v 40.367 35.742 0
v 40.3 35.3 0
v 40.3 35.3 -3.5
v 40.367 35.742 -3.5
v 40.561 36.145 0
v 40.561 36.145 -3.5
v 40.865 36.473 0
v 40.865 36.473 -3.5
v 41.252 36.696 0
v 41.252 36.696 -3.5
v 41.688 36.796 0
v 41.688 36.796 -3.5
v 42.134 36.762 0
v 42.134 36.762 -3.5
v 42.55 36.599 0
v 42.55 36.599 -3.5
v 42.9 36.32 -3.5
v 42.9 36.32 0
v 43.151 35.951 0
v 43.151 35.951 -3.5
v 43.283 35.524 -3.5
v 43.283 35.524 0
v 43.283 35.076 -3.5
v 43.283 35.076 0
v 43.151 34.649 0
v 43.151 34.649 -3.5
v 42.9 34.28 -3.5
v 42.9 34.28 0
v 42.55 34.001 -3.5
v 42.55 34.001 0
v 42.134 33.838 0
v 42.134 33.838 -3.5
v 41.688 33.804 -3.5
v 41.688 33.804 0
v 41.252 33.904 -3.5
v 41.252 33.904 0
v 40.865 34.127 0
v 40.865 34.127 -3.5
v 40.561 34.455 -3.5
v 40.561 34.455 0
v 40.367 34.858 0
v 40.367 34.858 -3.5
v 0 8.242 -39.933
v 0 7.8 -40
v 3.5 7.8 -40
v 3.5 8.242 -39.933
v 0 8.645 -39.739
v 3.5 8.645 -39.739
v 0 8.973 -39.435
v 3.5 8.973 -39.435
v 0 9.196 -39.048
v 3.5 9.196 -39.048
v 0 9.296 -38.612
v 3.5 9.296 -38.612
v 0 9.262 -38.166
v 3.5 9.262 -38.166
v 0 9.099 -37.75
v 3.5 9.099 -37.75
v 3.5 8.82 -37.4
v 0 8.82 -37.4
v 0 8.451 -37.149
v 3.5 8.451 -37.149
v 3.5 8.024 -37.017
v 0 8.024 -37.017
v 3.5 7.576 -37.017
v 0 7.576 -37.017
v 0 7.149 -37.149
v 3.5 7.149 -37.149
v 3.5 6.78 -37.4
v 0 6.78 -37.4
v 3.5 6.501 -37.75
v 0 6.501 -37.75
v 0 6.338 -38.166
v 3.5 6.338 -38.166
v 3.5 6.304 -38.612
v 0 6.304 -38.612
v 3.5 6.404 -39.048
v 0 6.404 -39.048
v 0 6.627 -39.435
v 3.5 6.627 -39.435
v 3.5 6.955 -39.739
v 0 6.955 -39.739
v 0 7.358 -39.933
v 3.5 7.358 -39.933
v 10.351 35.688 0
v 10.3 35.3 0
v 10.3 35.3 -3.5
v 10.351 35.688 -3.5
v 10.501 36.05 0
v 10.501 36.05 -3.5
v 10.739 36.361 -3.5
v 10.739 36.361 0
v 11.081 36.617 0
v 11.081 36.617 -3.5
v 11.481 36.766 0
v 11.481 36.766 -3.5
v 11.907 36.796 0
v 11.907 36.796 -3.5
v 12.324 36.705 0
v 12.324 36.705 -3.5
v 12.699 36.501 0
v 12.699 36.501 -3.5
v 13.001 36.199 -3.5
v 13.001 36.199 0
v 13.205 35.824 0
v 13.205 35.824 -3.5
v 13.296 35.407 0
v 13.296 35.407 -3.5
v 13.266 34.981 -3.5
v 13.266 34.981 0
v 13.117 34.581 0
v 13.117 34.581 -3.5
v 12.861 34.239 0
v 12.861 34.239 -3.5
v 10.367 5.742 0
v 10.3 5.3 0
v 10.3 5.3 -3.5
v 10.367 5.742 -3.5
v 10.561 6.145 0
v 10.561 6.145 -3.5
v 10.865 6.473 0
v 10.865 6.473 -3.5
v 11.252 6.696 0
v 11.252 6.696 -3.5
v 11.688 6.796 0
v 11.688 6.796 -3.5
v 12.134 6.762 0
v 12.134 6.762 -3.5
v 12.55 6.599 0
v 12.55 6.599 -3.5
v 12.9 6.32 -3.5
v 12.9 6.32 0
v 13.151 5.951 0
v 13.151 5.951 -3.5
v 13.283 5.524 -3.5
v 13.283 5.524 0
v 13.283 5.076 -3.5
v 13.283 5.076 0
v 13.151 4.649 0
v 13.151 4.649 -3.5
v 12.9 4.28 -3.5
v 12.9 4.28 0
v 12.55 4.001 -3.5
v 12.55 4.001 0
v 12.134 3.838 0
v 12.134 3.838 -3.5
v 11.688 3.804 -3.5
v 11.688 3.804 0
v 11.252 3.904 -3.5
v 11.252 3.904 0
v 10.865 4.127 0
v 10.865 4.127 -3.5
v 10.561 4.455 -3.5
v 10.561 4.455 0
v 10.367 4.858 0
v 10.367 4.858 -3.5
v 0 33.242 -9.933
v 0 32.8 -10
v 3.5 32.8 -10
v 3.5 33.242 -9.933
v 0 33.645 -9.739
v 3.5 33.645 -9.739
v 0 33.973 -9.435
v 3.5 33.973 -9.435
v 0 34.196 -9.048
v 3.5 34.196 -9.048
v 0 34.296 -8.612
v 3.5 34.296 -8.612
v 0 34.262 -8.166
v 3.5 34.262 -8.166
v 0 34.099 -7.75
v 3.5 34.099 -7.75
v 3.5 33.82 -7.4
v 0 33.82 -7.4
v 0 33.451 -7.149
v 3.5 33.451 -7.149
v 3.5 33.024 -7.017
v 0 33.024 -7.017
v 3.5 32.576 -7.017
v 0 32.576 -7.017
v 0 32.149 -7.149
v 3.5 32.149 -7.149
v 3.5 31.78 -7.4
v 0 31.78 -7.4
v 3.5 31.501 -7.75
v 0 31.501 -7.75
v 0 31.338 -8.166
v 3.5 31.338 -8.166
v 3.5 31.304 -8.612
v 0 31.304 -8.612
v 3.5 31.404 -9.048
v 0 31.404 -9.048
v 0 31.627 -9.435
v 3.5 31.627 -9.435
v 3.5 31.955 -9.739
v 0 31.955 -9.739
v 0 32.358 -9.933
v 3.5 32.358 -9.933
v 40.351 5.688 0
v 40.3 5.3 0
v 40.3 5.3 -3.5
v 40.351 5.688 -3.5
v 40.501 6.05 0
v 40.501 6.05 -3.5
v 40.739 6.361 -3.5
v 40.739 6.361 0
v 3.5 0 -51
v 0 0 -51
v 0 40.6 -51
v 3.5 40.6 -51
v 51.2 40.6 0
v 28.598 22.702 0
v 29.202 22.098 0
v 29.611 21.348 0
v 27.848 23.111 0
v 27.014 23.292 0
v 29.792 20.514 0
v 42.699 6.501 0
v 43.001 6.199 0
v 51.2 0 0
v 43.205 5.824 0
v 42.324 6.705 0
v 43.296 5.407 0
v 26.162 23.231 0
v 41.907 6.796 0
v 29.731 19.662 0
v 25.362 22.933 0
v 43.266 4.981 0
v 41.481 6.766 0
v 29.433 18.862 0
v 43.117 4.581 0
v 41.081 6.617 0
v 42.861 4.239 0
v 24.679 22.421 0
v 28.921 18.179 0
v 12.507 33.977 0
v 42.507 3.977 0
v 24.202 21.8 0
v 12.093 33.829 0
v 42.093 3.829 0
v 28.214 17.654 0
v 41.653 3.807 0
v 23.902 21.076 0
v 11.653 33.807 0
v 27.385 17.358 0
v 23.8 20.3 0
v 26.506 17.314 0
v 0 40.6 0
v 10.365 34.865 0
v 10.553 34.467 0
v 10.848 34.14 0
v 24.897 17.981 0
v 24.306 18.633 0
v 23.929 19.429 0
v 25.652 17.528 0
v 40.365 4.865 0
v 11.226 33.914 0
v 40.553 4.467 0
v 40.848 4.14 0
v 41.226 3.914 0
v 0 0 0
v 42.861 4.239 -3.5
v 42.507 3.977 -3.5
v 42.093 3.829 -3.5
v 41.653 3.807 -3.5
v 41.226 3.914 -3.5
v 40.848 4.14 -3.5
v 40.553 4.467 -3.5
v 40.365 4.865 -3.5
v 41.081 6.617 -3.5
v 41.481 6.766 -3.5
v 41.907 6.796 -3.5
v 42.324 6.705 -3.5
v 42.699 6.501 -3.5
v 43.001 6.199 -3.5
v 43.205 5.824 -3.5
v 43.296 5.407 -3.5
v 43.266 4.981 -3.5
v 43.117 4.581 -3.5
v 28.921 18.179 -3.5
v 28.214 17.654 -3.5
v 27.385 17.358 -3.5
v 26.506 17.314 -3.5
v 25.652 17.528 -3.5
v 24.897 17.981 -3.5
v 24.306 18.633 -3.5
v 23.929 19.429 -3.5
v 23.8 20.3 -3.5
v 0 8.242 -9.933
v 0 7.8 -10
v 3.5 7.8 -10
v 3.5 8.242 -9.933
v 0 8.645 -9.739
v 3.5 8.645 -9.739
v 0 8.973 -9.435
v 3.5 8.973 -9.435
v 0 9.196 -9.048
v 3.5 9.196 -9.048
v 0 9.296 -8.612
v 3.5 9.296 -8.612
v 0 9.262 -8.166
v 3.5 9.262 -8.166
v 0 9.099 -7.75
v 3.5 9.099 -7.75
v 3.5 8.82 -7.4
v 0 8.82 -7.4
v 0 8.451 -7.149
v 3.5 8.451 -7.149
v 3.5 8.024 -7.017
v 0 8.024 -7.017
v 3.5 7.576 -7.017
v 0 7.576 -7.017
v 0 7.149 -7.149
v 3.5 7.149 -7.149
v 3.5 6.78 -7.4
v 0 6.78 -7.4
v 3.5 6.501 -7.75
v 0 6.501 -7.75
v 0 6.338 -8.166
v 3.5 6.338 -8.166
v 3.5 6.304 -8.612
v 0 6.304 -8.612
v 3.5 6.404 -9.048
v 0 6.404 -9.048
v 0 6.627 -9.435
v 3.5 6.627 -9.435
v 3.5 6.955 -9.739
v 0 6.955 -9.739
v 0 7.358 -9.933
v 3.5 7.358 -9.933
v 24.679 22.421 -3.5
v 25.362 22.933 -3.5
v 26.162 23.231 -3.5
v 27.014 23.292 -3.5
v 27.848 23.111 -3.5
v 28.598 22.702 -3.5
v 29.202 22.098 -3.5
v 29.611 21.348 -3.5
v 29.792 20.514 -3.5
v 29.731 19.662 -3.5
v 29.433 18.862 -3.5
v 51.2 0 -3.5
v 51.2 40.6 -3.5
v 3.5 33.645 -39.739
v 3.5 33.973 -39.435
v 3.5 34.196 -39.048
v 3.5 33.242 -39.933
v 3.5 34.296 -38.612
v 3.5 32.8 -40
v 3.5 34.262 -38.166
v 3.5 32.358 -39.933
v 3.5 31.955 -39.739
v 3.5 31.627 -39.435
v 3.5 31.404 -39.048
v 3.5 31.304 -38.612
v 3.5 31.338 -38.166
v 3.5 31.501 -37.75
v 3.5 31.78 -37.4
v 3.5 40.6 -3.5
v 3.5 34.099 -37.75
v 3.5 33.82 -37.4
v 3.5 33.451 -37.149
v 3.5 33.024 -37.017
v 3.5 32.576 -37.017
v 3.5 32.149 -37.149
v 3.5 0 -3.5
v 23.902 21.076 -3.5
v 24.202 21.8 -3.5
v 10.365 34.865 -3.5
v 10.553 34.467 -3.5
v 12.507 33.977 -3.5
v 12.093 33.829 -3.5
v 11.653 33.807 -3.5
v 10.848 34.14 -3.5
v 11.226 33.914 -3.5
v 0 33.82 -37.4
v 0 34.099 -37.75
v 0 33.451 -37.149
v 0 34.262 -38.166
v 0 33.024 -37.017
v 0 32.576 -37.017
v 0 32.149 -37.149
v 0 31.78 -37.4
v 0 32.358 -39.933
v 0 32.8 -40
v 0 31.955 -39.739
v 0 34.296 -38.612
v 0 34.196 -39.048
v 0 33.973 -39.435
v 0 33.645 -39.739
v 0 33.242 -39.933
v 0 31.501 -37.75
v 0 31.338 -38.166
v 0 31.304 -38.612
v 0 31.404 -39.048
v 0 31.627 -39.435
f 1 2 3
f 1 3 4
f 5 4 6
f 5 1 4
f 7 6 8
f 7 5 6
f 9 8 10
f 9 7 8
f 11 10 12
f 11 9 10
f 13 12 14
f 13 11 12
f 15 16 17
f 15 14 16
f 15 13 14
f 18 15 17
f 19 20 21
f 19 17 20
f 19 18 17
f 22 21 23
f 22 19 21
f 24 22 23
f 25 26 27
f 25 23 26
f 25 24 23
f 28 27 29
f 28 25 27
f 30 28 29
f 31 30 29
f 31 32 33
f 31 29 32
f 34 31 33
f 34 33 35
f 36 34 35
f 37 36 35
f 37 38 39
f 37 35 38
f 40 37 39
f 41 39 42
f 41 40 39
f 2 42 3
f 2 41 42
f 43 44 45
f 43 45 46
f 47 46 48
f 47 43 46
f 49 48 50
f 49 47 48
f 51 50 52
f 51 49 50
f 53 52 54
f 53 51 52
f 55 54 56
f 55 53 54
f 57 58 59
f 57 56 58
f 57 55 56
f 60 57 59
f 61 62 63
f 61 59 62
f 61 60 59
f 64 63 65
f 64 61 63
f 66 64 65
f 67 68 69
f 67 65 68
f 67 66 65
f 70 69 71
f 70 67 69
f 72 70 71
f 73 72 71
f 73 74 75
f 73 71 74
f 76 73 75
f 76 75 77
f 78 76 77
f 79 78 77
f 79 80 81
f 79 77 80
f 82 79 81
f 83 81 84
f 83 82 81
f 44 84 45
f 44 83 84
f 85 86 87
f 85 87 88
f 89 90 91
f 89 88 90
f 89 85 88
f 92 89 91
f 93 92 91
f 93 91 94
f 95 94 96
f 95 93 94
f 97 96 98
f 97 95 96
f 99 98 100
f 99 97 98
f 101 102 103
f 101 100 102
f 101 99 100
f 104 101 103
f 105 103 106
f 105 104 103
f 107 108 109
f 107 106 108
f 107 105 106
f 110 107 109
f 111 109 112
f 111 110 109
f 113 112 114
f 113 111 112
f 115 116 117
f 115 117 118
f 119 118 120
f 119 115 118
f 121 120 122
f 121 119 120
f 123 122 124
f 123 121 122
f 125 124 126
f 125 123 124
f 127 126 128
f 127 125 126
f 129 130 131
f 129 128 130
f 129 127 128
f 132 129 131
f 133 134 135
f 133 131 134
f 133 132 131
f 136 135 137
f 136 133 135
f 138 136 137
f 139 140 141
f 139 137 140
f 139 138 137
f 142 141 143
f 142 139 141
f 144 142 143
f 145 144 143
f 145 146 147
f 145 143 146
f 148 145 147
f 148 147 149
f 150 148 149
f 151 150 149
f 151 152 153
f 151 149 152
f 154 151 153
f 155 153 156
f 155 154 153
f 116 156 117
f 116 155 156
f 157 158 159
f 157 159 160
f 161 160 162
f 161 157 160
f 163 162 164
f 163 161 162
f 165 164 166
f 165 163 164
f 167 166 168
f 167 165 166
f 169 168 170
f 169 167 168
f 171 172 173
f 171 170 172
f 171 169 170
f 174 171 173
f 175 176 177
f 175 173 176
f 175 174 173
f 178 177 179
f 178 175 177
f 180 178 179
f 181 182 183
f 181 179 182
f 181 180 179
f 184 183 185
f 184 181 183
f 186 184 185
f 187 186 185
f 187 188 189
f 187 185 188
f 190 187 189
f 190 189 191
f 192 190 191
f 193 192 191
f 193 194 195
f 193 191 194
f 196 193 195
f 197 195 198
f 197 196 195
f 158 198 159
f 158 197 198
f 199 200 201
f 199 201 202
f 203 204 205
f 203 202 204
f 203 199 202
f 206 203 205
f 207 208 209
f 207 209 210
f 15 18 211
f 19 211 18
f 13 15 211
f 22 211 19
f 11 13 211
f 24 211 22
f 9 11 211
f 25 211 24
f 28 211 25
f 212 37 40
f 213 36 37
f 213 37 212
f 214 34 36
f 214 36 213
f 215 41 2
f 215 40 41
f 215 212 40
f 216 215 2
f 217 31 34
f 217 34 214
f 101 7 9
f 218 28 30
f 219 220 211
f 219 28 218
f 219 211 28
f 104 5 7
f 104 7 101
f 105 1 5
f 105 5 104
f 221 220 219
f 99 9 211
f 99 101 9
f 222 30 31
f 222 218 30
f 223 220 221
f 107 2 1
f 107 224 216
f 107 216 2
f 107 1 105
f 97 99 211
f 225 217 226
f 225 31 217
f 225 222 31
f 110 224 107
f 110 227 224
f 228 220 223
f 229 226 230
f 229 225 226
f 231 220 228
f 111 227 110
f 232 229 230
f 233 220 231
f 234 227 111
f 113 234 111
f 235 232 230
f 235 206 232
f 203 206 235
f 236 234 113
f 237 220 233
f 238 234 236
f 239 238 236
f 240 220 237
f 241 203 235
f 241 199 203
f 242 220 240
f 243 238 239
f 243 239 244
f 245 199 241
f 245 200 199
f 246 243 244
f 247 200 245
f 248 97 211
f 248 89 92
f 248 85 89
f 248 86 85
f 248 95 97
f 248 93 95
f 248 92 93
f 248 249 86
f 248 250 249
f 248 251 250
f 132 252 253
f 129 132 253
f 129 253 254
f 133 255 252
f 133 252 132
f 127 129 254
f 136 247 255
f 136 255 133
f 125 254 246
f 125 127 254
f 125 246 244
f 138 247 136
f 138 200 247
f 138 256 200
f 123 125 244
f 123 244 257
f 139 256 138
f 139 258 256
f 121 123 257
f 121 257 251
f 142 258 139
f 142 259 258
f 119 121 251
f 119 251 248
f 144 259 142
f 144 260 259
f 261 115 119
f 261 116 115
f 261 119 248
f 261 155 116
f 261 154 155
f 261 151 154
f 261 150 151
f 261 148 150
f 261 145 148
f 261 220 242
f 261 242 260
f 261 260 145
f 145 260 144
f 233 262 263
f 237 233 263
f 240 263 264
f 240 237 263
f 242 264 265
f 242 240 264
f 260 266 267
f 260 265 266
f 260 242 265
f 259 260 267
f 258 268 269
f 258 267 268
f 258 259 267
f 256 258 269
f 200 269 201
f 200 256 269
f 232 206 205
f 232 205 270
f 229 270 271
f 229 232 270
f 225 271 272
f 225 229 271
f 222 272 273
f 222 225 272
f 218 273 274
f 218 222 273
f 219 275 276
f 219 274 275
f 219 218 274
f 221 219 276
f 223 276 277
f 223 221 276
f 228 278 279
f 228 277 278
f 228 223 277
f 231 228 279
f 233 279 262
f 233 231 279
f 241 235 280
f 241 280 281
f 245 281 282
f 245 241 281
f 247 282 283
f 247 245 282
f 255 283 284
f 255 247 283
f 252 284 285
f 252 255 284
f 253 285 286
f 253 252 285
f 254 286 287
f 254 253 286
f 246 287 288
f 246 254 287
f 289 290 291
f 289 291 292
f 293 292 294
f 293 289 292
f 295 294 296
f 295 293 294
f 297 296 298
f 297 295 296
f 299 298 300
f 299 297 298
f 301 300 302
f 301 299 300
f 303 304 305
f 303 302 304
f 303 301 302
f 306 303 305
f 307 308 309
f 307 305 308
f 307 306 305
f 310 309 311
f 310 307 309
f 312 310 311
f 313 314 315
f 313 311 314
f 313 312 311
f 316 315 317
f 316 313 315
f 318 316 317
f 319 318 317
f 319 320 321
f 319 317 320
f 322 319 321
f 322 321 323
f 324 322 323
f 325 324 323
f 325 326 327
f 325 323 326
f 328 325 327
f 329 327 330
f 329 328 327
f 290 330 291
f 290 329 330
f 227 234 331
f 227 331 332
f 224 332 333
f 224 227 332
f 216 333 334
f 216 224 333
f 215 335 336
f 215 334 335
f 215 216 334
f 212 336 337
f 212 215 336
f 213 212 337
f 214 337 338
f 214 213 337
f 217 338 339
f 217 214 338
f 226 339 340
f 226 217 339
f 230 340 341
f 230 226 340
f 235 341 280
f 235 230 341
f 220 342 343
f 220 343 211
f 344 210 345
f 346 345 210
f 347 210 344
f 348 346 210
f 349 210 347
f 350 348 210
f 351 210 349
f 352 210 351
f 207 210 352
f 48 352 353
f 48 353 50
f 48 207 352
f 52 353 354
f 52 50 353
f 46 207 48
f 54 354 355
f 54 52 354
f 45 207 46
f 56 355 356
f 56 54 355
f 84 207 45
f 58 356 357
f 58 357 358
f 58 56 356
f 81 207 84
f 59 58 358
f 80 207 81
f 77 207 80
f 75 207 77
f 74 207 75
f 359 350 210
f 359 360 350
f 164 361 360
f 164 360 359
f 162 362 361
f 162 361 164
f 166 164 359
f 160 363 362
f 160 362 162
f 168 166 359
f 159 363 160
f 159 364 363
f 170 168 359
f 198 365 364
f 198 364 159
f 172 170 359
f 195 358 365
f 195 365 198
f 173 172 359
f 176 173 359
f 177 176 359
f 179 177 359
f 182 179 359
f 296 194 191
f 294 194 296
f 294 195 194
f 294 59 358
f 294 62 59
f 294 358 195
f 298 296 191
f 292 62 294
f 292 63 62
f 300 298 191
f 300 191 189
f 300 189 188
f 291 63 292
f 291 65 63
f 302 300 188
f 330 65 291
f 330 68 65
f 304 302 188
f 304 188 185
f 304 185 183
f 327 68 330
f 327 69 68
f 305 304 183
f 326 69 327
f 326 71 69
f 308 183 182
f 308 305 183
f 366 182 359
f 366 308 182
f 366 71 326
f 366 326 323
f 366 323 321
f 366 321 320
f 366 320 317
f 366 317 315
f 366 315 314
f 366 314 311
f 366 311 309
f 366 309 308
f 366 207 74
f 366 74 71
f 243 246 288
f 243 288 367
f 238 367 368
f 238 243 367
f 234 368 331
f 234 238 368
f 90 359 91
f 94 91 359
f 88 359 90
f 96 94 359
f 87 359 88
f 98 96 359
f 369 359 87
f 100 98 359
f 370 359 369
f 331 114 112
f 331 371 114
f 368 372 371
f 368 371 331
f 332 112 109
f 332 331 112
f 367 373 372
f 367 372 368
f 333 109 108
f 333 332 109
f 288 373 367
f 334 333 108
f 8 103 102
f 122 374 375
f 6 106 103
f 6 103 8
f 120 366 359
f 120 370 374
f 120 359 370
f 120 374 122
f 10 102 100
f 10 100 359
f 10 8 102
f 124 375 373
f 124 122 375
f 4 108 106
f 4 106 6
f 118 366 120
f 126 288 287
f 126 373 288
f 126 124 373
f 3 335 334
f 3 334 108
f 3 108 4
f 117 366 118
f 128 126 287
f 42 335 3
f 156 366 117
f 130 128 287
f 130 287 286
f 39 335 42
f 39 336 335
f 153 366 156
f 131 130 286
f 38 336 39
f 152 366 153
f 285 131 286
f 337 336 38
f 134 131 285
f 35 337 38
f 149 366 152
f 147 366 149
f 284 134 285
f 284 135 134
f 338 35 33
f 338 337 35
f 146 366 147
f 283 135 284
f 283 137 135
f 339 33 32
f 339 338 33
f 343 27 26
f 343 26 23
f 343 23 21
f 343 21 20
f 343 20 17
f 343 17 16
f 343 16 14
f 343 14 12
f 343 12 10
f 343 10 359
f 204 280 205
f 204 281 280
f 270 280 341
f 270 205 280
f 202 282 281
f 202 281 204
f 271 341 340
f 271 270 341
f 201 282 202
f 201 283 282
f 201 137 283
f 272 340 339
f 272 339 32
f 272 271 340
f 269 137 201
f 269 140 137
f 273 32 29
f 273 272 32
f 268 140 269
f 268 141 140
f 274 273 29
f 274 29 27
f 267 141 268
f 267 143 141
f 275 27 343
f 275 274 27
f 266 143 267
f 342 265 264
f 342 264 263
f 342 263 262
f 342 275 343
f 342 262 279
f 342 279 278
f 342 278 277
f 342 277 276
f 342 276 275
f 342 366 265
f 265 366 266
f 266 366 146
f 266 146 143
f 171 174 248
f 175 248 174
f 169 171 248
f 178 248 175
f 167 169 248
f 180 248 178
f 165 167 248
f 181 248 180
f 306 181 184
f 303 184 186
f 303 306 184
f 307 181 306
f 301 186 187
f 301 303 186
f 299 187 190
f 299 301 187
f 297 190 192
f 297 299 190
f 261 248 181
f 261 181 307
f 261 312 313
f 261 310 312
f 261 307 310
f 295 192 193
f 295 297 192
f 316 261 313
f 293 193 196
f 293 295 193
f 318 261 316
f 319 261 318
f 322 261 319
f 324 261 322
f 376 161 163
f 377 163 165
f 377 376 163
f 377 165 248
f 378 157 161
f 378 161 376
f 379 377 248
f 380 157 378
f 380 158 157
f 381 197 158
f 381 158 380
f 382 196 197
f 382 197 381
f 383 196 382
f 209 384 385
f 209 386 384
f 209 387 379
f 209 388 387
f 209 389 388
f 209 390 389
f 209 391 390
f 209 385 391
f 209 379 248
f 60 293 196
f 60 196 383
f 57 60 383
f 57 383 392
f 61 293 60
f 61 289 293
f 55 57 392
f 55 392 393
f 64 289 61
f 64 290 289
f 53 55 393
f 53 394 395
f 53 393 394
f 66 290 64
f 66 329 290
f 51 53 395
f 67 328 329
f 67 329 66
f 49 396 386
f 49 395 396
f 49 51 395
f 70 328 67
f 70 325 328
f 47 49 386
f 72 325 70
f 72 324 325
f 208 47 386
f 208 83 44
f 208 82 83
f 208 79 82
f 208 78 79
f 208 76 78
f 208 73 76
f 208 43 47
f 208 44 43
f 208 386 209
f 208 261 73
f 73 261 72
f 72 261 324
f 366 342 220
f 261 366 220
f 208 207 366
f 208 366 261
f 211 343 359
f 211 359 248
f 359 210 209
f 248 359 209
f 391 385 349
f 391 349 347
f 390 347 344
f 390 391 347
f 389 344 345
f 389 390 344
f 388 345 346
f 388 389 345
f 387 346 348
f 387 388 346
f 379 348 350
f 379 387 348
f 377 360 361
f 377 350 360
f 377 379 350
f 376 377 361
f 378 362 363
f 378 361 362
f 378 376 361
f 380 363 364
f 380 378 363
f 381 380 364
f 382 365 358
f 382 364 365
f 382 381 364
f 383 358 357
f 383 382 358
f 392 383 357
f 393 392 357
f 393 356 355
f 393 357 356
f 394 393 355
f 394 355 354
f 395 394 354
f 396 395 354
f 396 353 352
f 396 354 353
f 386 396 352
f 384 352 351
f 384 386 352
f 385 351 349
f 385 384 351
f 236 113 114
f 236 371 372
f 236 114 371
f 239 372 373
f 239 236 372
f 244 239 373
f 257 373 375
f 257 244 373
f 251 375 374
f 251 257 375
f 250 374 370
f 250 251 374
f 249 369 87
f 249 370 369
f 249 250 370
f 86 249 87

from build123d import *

# Parameters (mm, degrees)
BOSS_EXTRUDE1_DEPTH     = 40.6
CUT_EXTRUDE1_DEPTH      = 81.783971182
CUT_EXTRUDE1_DEPTH_BACK = 81.783971182
SKETCH2_R               = 1.5
CUT_EXTRUDE2_DEPTH      = 81.775305632
CUT_EXTRUDE2_DEPTH_BACK = 81.775305632
SKETCH3_R               = 1.5


with BuildPart() as part:
    # Sketch1 → Boss-Extrude1 (new body)
    with BuildSketch(Plane(origin=(0, 0, 0), x_dir=(1, 0, 0), z_dir=(0, 1, 0))):
        Polygon((0, 0), (0, 51), (3.5, 51), (3.5, 3.5), (51.2, 3.5), (51.2, 0), align=None)
    extrude(amount=BOSS_EXTRUDE1_DEPTH)

    # Sketch2 → Cut-Extrude1 (cut, two sides: drawn at the far end of the back side and taken through both)
    with BuildSketch(Plane(origin=(0, 0, -3.5), x_dir=(-1, 0, 0), z_dir=(0, 0, -1)).offset(-CUT_EXTRUDE1_DEPTH_BACK)):
        with BuildLine():
            ThreePointArc((-10.3, 35.3), (-10.414180701, 35.874025149), (-10.739339828, 36.360660172))
            Line((-10.739339828, 36.360660172), (-12.860660172, 34.239339828))
            ThreePointArc((-12.860660172, 34.239339828), (-11.225974851, 33.914180701), (-10.3, 35.3))
        make_face()
        with BuildLine():
            Line((-12.860660172, 34.239339828), (-10.739339828, 36.360660172))
            ThreePointArc((-10.739339828, 36.360660172), (-12.860660172, 36.360660172), (-12.860660172, 34.239339828))
        make_face()
        with Locations((-41.8, 35.3)):
            Circle(SKETCH2_R)
        with BuildLine():
            ThreePointArc((-23.8, 20.3), (-24.028361402, 21.448050297), (-24.678679656, 22.421320344))
            Line((-24.678679656, 22.421320344), (-28.921320344, 18.178679656))
            ThreePointArc((-28.921320344, 18.178679656), (-25.651949703, 17.528361402), (-23.8, 20.3))
        make_face()
        with BuildLine():
            Line((-28.921320344, 18.178679656), (-24.678679656, 22.421320344))
            ThreePointArc((-24.678679656, 22.421320344), (-28.921320344, 22.421320344), (-28.921320344, 18.178679656))
        make_face()
        with Locations((-11.8, 5.3)):
            Circle(SKETCH2_R)
        with BuildLine():
            ThreePointArc((-40.3, 5.3), (-40.414180701, 5.874025149), (-40.739339828, 6.360660172))
            Line((-40.739339828, 6.360660172), (-42.860660172, 4.239339828))
            ThreePointArc((-42.860660172, 4.239339828), (-41.225974851, 3.914180701), (-40.3, 5.3))
        make_face()
        with BuildLine():
            Line((-42.860660172, 4.239339828), (-40.739339828, 6.360660172))
            ThreePointArc((-40.739339828, 6.360660172), (-42.860660172, 6.360660172), (-42.860660172, 4.239339828))
        make_face()
    extrude(amount=CUT_EXTRUDE1_DEPTH + CUT_EXTRUDE1_DEPTH_BACK, mode=Mode.SUBTRACT)

    # Sketch3 → Cut-Extrude2 (cut, two sides: drawn at the far end of the back side and taken through both)
    with BuildSketch(Plane(origin=(3.5, 0, 0), x_dir=(0, 0, -1), z_dir=(1, 0, 0)).offset(-CUT_EXTRUDE2_DEPTH_BACK)):
        with BuildLine():
            ThreePointArc((37, 32.8), (38.5, 31.3), (40, 32.8))
            Line((40, 32.8), (37, 32.8))
        make_face()
        with BuildLine():
            Line((37, 32.8), (40, 32.8))
            ThreePointArc((40, 32.8), (38.5, 34.3), (37, 32.8))
        make_face()
        with BuildLine():
            ThreePointArc((7, 32.8), (8.5, 31.3), (10, 32.8))
            Line((10, 32.8), (7, 32.8))
        make_face()
        with BuildLine():
            Line((7, 32.8), (10, 32.8))
            ThreePointArc((10, 32.8), (8.5, 34.3), (7, 32.8))
        make_face()
        with Locations((8.5, 7.8)):
            Circle(SKETCH3_R)
        with Locations((38.5, 7.8)):
            Circle(SKETCH3_R)
    extrude(amount=CUT_EXTRUDE2_DEPTH + CUT_EXTRUDE2_DEPTH_BACK, mode=Mode.SUBTRACT)


solid = part.part
